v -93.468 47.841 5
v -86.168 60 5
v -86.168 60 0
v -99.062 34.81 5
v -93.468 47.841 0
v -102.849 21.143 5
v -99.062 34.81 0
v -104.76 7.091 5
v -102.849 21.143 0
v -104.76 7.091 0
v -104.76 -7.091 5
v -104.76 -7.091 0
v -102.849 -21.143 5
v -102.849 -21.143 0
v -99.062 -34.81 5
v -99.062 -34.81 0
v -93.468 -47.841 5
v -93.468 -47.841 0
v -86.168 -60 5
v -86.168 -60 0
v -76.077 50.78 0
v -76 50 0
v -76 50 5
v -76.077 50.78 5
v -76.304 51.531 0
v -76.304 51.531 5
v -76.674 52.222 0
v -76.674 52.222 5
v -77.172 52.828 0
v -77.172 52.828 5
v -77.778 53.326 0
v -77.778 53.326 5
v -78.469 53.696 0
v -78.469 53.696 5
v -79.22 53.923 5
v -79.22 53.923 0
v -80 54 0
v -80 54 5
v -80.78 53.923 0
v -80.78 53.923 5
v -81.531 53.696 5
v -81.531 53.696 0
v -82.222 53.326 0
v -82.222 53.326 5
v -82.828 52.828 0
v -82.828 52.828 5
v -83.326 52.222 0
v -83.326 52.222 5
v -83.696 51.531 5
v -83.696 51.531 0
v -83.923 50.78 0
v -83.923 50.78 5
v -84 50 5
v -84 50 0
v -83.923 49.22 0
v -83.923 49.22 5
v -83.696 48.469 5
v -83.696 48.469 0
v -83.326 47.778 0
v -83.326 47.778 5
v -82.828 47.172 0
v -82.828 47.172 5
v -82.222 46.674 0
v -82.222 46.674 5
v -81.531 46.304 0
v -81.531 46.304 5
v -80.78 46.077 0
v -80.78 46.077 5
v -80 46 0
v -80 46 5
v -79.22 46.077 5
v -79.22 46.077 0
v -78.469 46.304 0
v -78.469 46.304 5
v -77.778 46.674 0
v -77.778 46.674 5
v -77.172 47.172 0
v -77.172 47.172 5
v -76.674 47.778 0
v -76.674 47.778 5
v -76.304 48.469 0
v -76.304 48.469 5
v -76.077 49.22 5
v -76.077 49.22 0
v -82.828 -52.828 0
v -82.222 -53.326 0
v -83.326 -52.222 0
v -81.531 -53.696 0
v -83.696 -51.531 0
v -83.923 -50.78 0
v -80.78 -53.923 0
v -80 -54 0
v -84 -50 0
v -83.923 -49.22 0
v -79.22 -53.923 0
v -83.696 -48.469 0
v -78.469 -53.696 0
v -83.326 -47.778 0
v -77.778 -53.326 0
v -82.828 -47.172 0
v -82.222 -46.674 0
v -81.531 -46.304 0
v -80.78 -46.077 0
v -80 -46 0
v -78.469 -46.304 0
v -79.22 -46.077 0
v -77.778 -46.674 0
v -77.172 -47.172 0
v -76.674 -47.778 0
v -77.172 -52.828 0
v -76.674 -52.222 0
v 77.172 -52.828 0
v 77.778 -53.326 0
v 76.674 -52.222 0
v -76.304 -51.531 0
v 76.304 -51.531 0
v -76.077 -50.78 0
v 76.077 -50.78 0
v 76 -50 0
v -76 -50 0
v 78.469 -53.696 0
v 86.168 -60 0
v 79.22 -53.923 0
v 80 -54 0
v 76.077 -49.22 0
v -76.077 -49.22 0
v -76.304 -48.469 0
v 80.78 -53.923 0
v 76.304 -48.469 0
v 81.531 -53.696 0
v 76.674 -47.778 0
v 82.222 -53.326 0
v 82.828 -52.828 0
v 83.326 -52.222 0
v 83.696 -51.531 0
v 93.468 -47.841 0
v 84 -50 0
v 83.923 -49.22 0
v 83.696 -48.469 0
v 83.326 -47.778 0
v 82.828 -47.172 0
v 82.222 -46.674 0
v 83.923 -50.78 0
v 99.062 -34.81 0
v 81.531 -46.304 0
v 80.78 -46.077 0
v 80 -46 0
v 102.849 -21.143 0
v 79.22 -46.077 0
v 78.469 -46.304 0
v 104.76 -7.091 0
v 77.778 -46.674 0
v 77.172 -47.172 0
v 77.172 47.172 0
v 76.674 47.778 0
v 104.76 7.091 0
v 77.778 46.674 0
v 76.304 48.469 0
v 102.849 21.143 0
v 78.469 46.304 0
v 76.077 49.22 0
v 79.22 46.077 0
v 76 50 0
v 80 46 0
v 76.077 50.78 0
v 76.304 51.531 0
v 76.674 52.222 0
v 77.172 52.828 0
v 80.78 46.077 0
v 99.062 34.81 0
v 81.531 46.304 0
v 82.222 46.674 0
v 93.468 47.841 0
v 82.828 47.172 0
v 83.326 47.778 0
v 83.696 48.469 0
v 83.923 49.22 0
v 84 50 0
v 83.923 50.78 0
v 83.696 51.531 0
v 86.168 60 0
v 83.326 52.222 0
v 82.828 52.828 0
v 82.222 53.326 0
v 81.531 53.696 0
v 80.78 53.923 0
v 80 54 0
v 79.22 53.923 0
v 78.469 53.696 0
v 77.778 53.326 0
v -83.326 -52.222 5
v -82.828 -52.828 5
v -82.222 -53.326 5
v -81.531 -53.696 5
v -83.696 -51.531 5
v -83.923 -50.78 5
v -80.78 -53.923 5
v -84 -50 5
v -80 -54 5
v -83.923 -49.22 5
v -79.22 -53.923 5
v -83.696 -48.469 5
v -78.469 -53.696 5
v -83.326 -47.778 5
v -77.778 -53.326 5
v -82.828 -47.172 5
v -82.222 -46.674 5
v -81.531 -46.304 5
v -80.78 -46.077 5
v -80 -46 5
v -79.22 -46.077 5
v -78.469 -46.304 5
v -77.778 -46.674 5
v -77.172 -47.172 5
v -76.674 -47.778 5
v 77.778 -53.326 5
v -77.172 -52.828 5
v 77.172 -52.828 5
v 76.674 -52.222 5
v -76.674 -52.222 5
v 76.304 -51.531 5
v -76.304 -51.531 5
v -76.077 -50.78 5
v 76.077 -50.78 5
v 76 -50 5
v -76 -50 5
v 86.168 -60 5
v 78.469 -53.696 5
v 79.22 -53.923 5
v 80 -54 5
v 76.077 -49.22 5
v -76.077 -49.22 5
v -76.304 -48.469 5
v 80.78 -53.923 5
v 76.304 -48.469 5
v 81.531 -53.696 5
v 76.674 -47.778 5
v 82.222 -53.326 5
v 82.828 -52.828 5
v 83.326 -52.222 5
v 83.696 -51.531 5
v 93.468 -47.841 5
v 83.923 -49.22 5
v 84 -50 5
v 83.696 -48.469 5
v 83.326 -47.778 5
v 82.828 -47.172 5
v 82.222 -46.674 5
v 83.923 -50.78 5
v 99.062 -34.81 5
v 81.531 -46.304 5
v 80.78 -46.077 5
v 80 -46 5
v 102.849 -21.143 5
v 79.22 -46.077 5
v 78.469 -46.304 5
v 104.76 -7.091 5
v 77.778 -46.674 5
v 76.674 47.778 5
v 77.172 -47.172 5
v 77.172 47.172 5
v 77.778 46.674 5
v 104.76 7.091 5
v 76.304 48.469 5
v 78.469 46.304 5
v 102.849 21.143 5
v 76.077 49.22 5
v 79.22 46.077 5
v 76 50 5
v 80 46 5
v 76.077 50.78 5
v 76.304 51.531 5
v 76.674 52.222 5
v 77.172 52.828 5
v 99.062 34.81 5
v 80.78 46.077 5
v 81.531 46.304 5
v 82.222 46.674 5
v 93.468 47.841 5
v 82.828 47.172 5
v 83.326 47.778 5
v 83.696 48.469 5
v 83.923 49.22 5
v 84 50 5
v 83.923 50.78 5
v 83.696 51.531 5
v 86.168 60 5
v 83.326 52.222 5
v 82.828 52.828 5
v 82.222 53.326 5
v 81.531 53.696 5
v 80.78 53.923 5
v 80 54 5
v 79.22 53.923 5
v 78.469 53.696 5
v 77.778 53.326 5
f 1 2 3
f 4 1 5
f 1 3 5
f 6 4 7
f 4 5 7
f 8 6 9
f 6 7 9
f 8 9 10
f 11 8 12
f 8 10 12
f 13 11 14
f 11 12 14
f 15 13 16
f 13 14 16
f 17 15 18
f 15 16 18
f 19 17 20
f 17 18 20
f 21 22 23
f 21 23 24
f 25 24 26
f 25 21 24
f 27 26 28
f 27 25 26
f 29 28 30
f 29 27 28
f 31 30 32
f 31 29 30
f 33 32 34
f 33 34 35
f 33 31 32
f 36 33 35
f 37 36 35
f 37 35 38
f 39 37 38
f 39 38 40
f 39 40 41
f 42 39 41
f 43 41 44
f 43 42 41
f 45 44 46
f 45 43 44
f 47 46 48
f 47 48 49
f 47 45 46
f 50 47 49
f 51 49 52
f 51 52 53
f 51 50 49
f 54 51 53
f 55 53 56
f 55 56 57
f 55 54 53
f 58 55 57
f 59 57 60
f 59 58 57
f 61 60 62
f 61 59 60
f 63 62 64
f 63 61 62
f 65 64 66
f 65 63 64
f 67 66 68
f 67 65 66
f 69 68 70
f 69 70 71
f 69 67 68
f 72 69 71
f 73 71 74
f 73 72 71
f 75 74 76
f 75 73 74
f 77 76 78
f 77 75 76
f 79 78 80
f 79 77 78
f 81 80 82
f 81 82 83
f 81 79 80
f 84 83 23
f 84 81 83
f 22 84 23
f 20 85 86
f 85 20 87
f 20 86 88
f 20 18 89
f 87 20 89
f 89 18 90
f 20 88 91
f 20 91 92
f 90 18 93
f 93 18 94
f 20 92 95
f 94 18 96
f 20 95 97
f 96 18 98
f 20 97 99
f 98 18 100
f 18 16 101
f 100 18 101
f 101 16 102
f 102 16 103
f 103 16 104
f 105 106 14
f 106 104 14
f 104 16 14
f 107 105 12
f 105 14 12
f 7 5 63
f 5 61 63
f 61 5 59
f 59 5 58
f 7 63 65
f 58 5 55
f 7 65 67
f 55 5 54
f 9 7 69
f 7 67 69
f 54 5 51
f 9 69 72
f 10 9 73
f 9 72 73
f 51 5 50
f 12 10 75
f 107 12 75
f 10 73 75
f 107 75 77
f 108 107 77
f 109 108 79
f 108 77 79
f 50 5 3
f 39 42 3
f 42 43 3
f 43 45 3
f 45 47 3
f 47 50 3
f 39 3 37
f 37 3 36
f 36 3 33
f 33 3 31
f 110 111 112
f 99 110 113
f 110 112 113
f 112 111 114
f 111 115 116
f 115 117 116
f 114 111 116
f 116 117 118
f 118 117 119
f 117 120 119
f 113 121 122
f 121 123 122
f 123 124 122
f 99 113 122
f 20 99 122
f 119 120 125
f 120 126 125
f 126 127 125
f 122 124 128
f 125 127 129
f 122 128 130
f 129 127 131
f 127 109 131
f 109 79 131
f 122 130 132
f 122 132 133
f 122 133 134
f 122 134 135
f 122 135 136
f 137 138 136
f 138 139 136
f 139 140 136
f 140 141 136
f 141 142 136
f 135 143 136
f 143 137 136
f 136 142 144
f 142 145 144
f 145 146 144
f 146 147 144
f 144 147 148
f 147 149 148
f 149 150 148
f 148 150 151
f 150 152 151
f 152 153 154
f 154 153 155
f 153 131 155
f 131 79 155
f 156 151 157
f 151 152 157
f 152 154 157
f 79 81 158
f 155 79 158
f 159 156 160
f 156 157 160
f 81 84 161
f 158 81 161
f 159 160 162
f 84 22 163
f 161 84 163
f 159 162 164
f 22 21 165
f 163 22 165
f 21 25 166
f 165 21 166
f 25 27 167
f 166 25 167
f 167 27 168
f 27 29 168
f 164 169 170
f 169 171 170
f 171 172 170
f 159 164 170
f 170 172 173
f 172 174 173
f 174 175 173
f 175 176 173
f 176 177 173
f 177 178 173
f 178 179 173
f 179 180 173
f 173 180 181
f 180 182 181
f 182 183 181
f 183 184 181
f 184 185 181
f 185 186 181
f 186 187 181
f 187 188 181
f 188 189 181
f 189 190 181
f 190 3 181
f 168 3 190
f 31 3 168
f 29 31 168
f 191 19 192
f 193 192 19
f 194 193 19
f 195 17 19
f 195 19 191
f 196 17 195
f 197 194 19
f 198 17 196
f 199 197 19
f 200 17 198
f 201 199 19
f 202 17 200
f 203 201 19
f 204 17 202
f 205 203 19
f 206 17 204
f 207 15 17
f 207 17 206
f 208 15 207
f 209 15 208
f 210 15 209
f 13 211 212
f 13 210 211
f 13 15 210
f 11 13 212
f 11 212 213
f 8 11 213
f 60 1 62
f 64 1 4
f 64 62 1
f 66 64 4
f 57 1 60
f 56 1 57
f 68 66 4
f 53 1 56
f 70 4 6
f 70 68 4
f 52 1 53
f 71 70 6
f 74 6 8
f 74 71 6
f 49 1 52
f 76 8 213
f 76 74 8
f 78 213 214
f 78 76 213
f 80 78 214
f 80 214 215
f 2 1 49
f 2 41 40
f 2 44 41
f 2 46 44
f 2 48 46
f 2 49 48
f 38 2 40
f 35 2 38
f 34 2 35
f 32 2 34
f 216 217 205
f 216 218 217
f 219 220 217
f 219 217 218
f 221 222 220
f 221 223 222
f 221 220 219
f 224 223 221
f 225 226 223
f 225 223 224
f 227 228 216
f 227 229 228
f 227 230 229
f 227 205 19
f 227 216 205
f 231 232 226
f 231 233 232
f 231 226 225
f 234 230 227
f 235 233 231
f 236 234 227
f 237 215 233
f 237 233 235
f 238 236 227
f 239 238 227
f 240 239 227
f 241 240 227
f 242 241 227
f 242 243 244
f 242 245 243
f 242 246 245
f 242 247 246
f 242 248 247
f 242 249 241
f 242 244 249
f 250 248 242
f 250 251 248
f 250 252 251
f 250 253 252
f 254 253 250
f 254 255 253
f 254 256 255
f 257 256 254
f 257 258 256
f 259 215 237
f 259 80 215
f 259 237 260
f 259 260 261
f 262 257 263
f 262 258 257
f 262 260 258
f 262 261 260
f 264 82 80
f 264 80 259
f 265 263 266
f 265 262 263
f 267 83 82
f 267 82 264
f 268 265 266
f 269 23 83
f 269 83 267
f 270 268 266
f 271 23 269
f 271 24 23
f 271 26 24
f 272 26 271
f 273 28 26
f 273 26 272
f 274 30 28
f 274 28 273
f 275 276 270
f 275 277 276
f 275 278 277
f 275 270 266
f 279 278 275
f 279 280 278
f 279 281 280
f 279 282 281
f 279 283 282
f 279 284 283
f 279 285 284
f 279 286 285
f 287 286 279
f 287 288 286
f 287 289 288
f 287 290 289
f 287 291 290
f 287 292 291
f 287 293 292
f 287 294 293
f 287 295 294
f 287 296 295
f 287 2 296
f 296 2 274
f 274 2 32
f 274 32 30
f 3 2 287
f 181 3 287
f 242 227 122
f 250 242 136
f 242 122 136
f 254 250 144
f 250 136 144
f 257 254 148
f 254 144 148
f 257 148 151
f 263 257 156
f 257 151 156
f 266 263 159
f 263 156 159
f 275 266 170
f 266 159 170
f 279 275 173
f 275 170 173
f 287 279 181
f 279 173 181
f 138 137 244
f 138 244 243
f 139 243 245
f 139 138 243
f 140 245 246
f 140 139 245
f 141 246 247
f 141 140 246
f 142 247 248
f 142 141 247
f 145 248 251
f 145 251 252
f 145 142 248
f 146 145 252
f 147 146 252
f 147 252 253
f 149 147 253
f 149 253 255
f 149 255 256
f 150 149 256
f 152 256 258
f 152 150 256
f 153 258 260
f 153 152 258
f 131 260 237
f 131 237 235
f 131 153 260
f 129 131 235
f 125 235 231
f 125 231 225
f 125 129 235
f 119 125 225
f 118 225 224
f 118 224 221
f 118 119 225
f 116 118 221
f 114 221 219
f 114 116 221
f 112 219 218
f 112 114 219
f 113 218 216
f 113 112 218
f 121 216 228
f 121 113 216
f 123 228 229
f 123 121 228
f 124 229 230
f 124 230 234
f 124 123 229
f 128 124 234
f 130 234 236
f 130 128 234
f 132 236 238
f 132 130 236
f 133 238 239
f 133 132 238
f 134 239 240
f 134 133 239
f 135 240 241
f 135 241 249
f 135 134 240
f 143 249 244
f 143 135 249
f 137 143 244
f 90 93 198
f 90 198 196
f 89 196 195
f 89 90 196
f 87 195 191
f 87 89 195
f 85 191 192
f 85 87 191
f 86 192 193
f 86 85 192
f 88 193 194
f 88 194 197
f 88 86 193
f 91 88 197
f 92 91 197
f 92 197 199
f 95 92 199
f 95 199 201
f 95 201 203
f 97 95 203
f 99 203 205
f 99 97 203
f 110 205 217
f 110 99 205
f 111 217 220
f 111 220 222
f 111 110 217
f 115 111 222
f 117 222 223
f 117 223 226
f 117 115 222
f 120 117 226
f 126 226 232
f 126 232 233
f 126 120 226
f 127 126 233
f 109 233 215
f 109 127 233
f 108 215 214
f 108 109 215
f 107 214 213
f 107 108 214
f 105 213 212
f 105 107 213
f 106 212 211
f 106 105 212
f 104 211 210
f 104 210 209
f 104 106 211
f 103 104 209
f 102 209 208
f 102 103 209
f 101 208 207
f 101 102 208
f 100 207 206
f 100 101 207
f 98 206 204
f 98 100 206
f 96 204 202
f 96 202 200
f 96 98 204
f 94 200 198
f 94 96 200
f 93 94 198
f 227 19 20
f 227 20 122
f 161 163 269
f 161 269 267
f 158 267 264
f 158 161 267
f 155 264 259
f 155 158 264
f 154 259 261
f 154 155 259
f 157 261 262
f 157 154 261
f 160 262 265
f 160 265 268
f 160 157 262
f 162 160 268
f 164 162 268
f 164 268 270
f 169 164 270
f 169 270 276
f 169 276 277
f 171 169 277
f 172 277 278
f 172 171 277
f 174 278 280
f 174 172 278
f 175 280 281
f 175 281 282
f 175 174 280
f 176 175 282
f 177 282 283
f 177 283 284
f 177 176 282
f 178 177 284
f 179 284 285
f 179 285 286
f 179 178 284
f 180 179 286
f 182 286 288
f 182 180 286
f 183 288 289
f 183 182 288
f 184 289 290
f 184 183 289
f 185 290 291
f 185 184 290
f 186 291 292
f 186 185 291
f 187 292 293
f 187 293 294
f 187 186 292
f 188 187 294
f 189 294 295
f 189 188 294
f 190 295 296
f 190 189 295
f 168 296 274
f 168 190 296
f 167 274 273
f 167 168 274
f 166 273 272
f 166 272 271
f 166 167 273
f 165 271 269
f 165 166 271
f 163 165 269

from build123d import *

# Parameters (mm, degrees)
ESQUISSE1_R             = 105
ESQUISSE1_R_2           = 4
BOSS_EXTRU_1_DEPTH      = 5
ESQUISSE2_W             = 250
ESQUISSE2_H             = 50
ENL_V_MAT_EXTRU_1_DEPTH = 149.576579581


with BuildPart() as part:
    # Esquisse1 → Boss.-Extru.1 (new body)
    with BuildSketch(Plane.XY):
        Circle(ESQUISSE1_R)
        with Locations((-80, 50)):
            Circle(ESQUISSE1_R_2, mode=Mode.SUBTRACT)
        with Locations(Location((80, 50, 0), (0, 0, 180))):
            Circle(ESQUISSE1_R_2, mode=Mode.SUBTRACT)
        with Locations((80, -50)):
            Circle(ESQUISSE1_R_2, mode=Mode.SUBTRACT)
        with Locations(Location((-80, -50, 0), (0, 0, 180))):
            Circle(ESQUISSE1_R_2, mode=Mode.SUBTRACT)
    extrude(amount=BOSS_EXTRU_1_DEPTH)

    # Esquisse2 → Enlèv. mat.-Extru.1 (cut, through all)
    with BuildSketch(Plane.XY.offset(5)):
        with Locations((0, 85)):
            Rectangle(ESQUISSE2_W, ESQUISSE2_H)
        with Locations((0, -85)):
            Rectangle(ESQUISSE2_W, ESQUISSE2_H)
    extrude(amount=-ENL_V_MAT_EXTRU_1_DEPTH, mode=Mode.SUBTRACT)


solid = part.part
